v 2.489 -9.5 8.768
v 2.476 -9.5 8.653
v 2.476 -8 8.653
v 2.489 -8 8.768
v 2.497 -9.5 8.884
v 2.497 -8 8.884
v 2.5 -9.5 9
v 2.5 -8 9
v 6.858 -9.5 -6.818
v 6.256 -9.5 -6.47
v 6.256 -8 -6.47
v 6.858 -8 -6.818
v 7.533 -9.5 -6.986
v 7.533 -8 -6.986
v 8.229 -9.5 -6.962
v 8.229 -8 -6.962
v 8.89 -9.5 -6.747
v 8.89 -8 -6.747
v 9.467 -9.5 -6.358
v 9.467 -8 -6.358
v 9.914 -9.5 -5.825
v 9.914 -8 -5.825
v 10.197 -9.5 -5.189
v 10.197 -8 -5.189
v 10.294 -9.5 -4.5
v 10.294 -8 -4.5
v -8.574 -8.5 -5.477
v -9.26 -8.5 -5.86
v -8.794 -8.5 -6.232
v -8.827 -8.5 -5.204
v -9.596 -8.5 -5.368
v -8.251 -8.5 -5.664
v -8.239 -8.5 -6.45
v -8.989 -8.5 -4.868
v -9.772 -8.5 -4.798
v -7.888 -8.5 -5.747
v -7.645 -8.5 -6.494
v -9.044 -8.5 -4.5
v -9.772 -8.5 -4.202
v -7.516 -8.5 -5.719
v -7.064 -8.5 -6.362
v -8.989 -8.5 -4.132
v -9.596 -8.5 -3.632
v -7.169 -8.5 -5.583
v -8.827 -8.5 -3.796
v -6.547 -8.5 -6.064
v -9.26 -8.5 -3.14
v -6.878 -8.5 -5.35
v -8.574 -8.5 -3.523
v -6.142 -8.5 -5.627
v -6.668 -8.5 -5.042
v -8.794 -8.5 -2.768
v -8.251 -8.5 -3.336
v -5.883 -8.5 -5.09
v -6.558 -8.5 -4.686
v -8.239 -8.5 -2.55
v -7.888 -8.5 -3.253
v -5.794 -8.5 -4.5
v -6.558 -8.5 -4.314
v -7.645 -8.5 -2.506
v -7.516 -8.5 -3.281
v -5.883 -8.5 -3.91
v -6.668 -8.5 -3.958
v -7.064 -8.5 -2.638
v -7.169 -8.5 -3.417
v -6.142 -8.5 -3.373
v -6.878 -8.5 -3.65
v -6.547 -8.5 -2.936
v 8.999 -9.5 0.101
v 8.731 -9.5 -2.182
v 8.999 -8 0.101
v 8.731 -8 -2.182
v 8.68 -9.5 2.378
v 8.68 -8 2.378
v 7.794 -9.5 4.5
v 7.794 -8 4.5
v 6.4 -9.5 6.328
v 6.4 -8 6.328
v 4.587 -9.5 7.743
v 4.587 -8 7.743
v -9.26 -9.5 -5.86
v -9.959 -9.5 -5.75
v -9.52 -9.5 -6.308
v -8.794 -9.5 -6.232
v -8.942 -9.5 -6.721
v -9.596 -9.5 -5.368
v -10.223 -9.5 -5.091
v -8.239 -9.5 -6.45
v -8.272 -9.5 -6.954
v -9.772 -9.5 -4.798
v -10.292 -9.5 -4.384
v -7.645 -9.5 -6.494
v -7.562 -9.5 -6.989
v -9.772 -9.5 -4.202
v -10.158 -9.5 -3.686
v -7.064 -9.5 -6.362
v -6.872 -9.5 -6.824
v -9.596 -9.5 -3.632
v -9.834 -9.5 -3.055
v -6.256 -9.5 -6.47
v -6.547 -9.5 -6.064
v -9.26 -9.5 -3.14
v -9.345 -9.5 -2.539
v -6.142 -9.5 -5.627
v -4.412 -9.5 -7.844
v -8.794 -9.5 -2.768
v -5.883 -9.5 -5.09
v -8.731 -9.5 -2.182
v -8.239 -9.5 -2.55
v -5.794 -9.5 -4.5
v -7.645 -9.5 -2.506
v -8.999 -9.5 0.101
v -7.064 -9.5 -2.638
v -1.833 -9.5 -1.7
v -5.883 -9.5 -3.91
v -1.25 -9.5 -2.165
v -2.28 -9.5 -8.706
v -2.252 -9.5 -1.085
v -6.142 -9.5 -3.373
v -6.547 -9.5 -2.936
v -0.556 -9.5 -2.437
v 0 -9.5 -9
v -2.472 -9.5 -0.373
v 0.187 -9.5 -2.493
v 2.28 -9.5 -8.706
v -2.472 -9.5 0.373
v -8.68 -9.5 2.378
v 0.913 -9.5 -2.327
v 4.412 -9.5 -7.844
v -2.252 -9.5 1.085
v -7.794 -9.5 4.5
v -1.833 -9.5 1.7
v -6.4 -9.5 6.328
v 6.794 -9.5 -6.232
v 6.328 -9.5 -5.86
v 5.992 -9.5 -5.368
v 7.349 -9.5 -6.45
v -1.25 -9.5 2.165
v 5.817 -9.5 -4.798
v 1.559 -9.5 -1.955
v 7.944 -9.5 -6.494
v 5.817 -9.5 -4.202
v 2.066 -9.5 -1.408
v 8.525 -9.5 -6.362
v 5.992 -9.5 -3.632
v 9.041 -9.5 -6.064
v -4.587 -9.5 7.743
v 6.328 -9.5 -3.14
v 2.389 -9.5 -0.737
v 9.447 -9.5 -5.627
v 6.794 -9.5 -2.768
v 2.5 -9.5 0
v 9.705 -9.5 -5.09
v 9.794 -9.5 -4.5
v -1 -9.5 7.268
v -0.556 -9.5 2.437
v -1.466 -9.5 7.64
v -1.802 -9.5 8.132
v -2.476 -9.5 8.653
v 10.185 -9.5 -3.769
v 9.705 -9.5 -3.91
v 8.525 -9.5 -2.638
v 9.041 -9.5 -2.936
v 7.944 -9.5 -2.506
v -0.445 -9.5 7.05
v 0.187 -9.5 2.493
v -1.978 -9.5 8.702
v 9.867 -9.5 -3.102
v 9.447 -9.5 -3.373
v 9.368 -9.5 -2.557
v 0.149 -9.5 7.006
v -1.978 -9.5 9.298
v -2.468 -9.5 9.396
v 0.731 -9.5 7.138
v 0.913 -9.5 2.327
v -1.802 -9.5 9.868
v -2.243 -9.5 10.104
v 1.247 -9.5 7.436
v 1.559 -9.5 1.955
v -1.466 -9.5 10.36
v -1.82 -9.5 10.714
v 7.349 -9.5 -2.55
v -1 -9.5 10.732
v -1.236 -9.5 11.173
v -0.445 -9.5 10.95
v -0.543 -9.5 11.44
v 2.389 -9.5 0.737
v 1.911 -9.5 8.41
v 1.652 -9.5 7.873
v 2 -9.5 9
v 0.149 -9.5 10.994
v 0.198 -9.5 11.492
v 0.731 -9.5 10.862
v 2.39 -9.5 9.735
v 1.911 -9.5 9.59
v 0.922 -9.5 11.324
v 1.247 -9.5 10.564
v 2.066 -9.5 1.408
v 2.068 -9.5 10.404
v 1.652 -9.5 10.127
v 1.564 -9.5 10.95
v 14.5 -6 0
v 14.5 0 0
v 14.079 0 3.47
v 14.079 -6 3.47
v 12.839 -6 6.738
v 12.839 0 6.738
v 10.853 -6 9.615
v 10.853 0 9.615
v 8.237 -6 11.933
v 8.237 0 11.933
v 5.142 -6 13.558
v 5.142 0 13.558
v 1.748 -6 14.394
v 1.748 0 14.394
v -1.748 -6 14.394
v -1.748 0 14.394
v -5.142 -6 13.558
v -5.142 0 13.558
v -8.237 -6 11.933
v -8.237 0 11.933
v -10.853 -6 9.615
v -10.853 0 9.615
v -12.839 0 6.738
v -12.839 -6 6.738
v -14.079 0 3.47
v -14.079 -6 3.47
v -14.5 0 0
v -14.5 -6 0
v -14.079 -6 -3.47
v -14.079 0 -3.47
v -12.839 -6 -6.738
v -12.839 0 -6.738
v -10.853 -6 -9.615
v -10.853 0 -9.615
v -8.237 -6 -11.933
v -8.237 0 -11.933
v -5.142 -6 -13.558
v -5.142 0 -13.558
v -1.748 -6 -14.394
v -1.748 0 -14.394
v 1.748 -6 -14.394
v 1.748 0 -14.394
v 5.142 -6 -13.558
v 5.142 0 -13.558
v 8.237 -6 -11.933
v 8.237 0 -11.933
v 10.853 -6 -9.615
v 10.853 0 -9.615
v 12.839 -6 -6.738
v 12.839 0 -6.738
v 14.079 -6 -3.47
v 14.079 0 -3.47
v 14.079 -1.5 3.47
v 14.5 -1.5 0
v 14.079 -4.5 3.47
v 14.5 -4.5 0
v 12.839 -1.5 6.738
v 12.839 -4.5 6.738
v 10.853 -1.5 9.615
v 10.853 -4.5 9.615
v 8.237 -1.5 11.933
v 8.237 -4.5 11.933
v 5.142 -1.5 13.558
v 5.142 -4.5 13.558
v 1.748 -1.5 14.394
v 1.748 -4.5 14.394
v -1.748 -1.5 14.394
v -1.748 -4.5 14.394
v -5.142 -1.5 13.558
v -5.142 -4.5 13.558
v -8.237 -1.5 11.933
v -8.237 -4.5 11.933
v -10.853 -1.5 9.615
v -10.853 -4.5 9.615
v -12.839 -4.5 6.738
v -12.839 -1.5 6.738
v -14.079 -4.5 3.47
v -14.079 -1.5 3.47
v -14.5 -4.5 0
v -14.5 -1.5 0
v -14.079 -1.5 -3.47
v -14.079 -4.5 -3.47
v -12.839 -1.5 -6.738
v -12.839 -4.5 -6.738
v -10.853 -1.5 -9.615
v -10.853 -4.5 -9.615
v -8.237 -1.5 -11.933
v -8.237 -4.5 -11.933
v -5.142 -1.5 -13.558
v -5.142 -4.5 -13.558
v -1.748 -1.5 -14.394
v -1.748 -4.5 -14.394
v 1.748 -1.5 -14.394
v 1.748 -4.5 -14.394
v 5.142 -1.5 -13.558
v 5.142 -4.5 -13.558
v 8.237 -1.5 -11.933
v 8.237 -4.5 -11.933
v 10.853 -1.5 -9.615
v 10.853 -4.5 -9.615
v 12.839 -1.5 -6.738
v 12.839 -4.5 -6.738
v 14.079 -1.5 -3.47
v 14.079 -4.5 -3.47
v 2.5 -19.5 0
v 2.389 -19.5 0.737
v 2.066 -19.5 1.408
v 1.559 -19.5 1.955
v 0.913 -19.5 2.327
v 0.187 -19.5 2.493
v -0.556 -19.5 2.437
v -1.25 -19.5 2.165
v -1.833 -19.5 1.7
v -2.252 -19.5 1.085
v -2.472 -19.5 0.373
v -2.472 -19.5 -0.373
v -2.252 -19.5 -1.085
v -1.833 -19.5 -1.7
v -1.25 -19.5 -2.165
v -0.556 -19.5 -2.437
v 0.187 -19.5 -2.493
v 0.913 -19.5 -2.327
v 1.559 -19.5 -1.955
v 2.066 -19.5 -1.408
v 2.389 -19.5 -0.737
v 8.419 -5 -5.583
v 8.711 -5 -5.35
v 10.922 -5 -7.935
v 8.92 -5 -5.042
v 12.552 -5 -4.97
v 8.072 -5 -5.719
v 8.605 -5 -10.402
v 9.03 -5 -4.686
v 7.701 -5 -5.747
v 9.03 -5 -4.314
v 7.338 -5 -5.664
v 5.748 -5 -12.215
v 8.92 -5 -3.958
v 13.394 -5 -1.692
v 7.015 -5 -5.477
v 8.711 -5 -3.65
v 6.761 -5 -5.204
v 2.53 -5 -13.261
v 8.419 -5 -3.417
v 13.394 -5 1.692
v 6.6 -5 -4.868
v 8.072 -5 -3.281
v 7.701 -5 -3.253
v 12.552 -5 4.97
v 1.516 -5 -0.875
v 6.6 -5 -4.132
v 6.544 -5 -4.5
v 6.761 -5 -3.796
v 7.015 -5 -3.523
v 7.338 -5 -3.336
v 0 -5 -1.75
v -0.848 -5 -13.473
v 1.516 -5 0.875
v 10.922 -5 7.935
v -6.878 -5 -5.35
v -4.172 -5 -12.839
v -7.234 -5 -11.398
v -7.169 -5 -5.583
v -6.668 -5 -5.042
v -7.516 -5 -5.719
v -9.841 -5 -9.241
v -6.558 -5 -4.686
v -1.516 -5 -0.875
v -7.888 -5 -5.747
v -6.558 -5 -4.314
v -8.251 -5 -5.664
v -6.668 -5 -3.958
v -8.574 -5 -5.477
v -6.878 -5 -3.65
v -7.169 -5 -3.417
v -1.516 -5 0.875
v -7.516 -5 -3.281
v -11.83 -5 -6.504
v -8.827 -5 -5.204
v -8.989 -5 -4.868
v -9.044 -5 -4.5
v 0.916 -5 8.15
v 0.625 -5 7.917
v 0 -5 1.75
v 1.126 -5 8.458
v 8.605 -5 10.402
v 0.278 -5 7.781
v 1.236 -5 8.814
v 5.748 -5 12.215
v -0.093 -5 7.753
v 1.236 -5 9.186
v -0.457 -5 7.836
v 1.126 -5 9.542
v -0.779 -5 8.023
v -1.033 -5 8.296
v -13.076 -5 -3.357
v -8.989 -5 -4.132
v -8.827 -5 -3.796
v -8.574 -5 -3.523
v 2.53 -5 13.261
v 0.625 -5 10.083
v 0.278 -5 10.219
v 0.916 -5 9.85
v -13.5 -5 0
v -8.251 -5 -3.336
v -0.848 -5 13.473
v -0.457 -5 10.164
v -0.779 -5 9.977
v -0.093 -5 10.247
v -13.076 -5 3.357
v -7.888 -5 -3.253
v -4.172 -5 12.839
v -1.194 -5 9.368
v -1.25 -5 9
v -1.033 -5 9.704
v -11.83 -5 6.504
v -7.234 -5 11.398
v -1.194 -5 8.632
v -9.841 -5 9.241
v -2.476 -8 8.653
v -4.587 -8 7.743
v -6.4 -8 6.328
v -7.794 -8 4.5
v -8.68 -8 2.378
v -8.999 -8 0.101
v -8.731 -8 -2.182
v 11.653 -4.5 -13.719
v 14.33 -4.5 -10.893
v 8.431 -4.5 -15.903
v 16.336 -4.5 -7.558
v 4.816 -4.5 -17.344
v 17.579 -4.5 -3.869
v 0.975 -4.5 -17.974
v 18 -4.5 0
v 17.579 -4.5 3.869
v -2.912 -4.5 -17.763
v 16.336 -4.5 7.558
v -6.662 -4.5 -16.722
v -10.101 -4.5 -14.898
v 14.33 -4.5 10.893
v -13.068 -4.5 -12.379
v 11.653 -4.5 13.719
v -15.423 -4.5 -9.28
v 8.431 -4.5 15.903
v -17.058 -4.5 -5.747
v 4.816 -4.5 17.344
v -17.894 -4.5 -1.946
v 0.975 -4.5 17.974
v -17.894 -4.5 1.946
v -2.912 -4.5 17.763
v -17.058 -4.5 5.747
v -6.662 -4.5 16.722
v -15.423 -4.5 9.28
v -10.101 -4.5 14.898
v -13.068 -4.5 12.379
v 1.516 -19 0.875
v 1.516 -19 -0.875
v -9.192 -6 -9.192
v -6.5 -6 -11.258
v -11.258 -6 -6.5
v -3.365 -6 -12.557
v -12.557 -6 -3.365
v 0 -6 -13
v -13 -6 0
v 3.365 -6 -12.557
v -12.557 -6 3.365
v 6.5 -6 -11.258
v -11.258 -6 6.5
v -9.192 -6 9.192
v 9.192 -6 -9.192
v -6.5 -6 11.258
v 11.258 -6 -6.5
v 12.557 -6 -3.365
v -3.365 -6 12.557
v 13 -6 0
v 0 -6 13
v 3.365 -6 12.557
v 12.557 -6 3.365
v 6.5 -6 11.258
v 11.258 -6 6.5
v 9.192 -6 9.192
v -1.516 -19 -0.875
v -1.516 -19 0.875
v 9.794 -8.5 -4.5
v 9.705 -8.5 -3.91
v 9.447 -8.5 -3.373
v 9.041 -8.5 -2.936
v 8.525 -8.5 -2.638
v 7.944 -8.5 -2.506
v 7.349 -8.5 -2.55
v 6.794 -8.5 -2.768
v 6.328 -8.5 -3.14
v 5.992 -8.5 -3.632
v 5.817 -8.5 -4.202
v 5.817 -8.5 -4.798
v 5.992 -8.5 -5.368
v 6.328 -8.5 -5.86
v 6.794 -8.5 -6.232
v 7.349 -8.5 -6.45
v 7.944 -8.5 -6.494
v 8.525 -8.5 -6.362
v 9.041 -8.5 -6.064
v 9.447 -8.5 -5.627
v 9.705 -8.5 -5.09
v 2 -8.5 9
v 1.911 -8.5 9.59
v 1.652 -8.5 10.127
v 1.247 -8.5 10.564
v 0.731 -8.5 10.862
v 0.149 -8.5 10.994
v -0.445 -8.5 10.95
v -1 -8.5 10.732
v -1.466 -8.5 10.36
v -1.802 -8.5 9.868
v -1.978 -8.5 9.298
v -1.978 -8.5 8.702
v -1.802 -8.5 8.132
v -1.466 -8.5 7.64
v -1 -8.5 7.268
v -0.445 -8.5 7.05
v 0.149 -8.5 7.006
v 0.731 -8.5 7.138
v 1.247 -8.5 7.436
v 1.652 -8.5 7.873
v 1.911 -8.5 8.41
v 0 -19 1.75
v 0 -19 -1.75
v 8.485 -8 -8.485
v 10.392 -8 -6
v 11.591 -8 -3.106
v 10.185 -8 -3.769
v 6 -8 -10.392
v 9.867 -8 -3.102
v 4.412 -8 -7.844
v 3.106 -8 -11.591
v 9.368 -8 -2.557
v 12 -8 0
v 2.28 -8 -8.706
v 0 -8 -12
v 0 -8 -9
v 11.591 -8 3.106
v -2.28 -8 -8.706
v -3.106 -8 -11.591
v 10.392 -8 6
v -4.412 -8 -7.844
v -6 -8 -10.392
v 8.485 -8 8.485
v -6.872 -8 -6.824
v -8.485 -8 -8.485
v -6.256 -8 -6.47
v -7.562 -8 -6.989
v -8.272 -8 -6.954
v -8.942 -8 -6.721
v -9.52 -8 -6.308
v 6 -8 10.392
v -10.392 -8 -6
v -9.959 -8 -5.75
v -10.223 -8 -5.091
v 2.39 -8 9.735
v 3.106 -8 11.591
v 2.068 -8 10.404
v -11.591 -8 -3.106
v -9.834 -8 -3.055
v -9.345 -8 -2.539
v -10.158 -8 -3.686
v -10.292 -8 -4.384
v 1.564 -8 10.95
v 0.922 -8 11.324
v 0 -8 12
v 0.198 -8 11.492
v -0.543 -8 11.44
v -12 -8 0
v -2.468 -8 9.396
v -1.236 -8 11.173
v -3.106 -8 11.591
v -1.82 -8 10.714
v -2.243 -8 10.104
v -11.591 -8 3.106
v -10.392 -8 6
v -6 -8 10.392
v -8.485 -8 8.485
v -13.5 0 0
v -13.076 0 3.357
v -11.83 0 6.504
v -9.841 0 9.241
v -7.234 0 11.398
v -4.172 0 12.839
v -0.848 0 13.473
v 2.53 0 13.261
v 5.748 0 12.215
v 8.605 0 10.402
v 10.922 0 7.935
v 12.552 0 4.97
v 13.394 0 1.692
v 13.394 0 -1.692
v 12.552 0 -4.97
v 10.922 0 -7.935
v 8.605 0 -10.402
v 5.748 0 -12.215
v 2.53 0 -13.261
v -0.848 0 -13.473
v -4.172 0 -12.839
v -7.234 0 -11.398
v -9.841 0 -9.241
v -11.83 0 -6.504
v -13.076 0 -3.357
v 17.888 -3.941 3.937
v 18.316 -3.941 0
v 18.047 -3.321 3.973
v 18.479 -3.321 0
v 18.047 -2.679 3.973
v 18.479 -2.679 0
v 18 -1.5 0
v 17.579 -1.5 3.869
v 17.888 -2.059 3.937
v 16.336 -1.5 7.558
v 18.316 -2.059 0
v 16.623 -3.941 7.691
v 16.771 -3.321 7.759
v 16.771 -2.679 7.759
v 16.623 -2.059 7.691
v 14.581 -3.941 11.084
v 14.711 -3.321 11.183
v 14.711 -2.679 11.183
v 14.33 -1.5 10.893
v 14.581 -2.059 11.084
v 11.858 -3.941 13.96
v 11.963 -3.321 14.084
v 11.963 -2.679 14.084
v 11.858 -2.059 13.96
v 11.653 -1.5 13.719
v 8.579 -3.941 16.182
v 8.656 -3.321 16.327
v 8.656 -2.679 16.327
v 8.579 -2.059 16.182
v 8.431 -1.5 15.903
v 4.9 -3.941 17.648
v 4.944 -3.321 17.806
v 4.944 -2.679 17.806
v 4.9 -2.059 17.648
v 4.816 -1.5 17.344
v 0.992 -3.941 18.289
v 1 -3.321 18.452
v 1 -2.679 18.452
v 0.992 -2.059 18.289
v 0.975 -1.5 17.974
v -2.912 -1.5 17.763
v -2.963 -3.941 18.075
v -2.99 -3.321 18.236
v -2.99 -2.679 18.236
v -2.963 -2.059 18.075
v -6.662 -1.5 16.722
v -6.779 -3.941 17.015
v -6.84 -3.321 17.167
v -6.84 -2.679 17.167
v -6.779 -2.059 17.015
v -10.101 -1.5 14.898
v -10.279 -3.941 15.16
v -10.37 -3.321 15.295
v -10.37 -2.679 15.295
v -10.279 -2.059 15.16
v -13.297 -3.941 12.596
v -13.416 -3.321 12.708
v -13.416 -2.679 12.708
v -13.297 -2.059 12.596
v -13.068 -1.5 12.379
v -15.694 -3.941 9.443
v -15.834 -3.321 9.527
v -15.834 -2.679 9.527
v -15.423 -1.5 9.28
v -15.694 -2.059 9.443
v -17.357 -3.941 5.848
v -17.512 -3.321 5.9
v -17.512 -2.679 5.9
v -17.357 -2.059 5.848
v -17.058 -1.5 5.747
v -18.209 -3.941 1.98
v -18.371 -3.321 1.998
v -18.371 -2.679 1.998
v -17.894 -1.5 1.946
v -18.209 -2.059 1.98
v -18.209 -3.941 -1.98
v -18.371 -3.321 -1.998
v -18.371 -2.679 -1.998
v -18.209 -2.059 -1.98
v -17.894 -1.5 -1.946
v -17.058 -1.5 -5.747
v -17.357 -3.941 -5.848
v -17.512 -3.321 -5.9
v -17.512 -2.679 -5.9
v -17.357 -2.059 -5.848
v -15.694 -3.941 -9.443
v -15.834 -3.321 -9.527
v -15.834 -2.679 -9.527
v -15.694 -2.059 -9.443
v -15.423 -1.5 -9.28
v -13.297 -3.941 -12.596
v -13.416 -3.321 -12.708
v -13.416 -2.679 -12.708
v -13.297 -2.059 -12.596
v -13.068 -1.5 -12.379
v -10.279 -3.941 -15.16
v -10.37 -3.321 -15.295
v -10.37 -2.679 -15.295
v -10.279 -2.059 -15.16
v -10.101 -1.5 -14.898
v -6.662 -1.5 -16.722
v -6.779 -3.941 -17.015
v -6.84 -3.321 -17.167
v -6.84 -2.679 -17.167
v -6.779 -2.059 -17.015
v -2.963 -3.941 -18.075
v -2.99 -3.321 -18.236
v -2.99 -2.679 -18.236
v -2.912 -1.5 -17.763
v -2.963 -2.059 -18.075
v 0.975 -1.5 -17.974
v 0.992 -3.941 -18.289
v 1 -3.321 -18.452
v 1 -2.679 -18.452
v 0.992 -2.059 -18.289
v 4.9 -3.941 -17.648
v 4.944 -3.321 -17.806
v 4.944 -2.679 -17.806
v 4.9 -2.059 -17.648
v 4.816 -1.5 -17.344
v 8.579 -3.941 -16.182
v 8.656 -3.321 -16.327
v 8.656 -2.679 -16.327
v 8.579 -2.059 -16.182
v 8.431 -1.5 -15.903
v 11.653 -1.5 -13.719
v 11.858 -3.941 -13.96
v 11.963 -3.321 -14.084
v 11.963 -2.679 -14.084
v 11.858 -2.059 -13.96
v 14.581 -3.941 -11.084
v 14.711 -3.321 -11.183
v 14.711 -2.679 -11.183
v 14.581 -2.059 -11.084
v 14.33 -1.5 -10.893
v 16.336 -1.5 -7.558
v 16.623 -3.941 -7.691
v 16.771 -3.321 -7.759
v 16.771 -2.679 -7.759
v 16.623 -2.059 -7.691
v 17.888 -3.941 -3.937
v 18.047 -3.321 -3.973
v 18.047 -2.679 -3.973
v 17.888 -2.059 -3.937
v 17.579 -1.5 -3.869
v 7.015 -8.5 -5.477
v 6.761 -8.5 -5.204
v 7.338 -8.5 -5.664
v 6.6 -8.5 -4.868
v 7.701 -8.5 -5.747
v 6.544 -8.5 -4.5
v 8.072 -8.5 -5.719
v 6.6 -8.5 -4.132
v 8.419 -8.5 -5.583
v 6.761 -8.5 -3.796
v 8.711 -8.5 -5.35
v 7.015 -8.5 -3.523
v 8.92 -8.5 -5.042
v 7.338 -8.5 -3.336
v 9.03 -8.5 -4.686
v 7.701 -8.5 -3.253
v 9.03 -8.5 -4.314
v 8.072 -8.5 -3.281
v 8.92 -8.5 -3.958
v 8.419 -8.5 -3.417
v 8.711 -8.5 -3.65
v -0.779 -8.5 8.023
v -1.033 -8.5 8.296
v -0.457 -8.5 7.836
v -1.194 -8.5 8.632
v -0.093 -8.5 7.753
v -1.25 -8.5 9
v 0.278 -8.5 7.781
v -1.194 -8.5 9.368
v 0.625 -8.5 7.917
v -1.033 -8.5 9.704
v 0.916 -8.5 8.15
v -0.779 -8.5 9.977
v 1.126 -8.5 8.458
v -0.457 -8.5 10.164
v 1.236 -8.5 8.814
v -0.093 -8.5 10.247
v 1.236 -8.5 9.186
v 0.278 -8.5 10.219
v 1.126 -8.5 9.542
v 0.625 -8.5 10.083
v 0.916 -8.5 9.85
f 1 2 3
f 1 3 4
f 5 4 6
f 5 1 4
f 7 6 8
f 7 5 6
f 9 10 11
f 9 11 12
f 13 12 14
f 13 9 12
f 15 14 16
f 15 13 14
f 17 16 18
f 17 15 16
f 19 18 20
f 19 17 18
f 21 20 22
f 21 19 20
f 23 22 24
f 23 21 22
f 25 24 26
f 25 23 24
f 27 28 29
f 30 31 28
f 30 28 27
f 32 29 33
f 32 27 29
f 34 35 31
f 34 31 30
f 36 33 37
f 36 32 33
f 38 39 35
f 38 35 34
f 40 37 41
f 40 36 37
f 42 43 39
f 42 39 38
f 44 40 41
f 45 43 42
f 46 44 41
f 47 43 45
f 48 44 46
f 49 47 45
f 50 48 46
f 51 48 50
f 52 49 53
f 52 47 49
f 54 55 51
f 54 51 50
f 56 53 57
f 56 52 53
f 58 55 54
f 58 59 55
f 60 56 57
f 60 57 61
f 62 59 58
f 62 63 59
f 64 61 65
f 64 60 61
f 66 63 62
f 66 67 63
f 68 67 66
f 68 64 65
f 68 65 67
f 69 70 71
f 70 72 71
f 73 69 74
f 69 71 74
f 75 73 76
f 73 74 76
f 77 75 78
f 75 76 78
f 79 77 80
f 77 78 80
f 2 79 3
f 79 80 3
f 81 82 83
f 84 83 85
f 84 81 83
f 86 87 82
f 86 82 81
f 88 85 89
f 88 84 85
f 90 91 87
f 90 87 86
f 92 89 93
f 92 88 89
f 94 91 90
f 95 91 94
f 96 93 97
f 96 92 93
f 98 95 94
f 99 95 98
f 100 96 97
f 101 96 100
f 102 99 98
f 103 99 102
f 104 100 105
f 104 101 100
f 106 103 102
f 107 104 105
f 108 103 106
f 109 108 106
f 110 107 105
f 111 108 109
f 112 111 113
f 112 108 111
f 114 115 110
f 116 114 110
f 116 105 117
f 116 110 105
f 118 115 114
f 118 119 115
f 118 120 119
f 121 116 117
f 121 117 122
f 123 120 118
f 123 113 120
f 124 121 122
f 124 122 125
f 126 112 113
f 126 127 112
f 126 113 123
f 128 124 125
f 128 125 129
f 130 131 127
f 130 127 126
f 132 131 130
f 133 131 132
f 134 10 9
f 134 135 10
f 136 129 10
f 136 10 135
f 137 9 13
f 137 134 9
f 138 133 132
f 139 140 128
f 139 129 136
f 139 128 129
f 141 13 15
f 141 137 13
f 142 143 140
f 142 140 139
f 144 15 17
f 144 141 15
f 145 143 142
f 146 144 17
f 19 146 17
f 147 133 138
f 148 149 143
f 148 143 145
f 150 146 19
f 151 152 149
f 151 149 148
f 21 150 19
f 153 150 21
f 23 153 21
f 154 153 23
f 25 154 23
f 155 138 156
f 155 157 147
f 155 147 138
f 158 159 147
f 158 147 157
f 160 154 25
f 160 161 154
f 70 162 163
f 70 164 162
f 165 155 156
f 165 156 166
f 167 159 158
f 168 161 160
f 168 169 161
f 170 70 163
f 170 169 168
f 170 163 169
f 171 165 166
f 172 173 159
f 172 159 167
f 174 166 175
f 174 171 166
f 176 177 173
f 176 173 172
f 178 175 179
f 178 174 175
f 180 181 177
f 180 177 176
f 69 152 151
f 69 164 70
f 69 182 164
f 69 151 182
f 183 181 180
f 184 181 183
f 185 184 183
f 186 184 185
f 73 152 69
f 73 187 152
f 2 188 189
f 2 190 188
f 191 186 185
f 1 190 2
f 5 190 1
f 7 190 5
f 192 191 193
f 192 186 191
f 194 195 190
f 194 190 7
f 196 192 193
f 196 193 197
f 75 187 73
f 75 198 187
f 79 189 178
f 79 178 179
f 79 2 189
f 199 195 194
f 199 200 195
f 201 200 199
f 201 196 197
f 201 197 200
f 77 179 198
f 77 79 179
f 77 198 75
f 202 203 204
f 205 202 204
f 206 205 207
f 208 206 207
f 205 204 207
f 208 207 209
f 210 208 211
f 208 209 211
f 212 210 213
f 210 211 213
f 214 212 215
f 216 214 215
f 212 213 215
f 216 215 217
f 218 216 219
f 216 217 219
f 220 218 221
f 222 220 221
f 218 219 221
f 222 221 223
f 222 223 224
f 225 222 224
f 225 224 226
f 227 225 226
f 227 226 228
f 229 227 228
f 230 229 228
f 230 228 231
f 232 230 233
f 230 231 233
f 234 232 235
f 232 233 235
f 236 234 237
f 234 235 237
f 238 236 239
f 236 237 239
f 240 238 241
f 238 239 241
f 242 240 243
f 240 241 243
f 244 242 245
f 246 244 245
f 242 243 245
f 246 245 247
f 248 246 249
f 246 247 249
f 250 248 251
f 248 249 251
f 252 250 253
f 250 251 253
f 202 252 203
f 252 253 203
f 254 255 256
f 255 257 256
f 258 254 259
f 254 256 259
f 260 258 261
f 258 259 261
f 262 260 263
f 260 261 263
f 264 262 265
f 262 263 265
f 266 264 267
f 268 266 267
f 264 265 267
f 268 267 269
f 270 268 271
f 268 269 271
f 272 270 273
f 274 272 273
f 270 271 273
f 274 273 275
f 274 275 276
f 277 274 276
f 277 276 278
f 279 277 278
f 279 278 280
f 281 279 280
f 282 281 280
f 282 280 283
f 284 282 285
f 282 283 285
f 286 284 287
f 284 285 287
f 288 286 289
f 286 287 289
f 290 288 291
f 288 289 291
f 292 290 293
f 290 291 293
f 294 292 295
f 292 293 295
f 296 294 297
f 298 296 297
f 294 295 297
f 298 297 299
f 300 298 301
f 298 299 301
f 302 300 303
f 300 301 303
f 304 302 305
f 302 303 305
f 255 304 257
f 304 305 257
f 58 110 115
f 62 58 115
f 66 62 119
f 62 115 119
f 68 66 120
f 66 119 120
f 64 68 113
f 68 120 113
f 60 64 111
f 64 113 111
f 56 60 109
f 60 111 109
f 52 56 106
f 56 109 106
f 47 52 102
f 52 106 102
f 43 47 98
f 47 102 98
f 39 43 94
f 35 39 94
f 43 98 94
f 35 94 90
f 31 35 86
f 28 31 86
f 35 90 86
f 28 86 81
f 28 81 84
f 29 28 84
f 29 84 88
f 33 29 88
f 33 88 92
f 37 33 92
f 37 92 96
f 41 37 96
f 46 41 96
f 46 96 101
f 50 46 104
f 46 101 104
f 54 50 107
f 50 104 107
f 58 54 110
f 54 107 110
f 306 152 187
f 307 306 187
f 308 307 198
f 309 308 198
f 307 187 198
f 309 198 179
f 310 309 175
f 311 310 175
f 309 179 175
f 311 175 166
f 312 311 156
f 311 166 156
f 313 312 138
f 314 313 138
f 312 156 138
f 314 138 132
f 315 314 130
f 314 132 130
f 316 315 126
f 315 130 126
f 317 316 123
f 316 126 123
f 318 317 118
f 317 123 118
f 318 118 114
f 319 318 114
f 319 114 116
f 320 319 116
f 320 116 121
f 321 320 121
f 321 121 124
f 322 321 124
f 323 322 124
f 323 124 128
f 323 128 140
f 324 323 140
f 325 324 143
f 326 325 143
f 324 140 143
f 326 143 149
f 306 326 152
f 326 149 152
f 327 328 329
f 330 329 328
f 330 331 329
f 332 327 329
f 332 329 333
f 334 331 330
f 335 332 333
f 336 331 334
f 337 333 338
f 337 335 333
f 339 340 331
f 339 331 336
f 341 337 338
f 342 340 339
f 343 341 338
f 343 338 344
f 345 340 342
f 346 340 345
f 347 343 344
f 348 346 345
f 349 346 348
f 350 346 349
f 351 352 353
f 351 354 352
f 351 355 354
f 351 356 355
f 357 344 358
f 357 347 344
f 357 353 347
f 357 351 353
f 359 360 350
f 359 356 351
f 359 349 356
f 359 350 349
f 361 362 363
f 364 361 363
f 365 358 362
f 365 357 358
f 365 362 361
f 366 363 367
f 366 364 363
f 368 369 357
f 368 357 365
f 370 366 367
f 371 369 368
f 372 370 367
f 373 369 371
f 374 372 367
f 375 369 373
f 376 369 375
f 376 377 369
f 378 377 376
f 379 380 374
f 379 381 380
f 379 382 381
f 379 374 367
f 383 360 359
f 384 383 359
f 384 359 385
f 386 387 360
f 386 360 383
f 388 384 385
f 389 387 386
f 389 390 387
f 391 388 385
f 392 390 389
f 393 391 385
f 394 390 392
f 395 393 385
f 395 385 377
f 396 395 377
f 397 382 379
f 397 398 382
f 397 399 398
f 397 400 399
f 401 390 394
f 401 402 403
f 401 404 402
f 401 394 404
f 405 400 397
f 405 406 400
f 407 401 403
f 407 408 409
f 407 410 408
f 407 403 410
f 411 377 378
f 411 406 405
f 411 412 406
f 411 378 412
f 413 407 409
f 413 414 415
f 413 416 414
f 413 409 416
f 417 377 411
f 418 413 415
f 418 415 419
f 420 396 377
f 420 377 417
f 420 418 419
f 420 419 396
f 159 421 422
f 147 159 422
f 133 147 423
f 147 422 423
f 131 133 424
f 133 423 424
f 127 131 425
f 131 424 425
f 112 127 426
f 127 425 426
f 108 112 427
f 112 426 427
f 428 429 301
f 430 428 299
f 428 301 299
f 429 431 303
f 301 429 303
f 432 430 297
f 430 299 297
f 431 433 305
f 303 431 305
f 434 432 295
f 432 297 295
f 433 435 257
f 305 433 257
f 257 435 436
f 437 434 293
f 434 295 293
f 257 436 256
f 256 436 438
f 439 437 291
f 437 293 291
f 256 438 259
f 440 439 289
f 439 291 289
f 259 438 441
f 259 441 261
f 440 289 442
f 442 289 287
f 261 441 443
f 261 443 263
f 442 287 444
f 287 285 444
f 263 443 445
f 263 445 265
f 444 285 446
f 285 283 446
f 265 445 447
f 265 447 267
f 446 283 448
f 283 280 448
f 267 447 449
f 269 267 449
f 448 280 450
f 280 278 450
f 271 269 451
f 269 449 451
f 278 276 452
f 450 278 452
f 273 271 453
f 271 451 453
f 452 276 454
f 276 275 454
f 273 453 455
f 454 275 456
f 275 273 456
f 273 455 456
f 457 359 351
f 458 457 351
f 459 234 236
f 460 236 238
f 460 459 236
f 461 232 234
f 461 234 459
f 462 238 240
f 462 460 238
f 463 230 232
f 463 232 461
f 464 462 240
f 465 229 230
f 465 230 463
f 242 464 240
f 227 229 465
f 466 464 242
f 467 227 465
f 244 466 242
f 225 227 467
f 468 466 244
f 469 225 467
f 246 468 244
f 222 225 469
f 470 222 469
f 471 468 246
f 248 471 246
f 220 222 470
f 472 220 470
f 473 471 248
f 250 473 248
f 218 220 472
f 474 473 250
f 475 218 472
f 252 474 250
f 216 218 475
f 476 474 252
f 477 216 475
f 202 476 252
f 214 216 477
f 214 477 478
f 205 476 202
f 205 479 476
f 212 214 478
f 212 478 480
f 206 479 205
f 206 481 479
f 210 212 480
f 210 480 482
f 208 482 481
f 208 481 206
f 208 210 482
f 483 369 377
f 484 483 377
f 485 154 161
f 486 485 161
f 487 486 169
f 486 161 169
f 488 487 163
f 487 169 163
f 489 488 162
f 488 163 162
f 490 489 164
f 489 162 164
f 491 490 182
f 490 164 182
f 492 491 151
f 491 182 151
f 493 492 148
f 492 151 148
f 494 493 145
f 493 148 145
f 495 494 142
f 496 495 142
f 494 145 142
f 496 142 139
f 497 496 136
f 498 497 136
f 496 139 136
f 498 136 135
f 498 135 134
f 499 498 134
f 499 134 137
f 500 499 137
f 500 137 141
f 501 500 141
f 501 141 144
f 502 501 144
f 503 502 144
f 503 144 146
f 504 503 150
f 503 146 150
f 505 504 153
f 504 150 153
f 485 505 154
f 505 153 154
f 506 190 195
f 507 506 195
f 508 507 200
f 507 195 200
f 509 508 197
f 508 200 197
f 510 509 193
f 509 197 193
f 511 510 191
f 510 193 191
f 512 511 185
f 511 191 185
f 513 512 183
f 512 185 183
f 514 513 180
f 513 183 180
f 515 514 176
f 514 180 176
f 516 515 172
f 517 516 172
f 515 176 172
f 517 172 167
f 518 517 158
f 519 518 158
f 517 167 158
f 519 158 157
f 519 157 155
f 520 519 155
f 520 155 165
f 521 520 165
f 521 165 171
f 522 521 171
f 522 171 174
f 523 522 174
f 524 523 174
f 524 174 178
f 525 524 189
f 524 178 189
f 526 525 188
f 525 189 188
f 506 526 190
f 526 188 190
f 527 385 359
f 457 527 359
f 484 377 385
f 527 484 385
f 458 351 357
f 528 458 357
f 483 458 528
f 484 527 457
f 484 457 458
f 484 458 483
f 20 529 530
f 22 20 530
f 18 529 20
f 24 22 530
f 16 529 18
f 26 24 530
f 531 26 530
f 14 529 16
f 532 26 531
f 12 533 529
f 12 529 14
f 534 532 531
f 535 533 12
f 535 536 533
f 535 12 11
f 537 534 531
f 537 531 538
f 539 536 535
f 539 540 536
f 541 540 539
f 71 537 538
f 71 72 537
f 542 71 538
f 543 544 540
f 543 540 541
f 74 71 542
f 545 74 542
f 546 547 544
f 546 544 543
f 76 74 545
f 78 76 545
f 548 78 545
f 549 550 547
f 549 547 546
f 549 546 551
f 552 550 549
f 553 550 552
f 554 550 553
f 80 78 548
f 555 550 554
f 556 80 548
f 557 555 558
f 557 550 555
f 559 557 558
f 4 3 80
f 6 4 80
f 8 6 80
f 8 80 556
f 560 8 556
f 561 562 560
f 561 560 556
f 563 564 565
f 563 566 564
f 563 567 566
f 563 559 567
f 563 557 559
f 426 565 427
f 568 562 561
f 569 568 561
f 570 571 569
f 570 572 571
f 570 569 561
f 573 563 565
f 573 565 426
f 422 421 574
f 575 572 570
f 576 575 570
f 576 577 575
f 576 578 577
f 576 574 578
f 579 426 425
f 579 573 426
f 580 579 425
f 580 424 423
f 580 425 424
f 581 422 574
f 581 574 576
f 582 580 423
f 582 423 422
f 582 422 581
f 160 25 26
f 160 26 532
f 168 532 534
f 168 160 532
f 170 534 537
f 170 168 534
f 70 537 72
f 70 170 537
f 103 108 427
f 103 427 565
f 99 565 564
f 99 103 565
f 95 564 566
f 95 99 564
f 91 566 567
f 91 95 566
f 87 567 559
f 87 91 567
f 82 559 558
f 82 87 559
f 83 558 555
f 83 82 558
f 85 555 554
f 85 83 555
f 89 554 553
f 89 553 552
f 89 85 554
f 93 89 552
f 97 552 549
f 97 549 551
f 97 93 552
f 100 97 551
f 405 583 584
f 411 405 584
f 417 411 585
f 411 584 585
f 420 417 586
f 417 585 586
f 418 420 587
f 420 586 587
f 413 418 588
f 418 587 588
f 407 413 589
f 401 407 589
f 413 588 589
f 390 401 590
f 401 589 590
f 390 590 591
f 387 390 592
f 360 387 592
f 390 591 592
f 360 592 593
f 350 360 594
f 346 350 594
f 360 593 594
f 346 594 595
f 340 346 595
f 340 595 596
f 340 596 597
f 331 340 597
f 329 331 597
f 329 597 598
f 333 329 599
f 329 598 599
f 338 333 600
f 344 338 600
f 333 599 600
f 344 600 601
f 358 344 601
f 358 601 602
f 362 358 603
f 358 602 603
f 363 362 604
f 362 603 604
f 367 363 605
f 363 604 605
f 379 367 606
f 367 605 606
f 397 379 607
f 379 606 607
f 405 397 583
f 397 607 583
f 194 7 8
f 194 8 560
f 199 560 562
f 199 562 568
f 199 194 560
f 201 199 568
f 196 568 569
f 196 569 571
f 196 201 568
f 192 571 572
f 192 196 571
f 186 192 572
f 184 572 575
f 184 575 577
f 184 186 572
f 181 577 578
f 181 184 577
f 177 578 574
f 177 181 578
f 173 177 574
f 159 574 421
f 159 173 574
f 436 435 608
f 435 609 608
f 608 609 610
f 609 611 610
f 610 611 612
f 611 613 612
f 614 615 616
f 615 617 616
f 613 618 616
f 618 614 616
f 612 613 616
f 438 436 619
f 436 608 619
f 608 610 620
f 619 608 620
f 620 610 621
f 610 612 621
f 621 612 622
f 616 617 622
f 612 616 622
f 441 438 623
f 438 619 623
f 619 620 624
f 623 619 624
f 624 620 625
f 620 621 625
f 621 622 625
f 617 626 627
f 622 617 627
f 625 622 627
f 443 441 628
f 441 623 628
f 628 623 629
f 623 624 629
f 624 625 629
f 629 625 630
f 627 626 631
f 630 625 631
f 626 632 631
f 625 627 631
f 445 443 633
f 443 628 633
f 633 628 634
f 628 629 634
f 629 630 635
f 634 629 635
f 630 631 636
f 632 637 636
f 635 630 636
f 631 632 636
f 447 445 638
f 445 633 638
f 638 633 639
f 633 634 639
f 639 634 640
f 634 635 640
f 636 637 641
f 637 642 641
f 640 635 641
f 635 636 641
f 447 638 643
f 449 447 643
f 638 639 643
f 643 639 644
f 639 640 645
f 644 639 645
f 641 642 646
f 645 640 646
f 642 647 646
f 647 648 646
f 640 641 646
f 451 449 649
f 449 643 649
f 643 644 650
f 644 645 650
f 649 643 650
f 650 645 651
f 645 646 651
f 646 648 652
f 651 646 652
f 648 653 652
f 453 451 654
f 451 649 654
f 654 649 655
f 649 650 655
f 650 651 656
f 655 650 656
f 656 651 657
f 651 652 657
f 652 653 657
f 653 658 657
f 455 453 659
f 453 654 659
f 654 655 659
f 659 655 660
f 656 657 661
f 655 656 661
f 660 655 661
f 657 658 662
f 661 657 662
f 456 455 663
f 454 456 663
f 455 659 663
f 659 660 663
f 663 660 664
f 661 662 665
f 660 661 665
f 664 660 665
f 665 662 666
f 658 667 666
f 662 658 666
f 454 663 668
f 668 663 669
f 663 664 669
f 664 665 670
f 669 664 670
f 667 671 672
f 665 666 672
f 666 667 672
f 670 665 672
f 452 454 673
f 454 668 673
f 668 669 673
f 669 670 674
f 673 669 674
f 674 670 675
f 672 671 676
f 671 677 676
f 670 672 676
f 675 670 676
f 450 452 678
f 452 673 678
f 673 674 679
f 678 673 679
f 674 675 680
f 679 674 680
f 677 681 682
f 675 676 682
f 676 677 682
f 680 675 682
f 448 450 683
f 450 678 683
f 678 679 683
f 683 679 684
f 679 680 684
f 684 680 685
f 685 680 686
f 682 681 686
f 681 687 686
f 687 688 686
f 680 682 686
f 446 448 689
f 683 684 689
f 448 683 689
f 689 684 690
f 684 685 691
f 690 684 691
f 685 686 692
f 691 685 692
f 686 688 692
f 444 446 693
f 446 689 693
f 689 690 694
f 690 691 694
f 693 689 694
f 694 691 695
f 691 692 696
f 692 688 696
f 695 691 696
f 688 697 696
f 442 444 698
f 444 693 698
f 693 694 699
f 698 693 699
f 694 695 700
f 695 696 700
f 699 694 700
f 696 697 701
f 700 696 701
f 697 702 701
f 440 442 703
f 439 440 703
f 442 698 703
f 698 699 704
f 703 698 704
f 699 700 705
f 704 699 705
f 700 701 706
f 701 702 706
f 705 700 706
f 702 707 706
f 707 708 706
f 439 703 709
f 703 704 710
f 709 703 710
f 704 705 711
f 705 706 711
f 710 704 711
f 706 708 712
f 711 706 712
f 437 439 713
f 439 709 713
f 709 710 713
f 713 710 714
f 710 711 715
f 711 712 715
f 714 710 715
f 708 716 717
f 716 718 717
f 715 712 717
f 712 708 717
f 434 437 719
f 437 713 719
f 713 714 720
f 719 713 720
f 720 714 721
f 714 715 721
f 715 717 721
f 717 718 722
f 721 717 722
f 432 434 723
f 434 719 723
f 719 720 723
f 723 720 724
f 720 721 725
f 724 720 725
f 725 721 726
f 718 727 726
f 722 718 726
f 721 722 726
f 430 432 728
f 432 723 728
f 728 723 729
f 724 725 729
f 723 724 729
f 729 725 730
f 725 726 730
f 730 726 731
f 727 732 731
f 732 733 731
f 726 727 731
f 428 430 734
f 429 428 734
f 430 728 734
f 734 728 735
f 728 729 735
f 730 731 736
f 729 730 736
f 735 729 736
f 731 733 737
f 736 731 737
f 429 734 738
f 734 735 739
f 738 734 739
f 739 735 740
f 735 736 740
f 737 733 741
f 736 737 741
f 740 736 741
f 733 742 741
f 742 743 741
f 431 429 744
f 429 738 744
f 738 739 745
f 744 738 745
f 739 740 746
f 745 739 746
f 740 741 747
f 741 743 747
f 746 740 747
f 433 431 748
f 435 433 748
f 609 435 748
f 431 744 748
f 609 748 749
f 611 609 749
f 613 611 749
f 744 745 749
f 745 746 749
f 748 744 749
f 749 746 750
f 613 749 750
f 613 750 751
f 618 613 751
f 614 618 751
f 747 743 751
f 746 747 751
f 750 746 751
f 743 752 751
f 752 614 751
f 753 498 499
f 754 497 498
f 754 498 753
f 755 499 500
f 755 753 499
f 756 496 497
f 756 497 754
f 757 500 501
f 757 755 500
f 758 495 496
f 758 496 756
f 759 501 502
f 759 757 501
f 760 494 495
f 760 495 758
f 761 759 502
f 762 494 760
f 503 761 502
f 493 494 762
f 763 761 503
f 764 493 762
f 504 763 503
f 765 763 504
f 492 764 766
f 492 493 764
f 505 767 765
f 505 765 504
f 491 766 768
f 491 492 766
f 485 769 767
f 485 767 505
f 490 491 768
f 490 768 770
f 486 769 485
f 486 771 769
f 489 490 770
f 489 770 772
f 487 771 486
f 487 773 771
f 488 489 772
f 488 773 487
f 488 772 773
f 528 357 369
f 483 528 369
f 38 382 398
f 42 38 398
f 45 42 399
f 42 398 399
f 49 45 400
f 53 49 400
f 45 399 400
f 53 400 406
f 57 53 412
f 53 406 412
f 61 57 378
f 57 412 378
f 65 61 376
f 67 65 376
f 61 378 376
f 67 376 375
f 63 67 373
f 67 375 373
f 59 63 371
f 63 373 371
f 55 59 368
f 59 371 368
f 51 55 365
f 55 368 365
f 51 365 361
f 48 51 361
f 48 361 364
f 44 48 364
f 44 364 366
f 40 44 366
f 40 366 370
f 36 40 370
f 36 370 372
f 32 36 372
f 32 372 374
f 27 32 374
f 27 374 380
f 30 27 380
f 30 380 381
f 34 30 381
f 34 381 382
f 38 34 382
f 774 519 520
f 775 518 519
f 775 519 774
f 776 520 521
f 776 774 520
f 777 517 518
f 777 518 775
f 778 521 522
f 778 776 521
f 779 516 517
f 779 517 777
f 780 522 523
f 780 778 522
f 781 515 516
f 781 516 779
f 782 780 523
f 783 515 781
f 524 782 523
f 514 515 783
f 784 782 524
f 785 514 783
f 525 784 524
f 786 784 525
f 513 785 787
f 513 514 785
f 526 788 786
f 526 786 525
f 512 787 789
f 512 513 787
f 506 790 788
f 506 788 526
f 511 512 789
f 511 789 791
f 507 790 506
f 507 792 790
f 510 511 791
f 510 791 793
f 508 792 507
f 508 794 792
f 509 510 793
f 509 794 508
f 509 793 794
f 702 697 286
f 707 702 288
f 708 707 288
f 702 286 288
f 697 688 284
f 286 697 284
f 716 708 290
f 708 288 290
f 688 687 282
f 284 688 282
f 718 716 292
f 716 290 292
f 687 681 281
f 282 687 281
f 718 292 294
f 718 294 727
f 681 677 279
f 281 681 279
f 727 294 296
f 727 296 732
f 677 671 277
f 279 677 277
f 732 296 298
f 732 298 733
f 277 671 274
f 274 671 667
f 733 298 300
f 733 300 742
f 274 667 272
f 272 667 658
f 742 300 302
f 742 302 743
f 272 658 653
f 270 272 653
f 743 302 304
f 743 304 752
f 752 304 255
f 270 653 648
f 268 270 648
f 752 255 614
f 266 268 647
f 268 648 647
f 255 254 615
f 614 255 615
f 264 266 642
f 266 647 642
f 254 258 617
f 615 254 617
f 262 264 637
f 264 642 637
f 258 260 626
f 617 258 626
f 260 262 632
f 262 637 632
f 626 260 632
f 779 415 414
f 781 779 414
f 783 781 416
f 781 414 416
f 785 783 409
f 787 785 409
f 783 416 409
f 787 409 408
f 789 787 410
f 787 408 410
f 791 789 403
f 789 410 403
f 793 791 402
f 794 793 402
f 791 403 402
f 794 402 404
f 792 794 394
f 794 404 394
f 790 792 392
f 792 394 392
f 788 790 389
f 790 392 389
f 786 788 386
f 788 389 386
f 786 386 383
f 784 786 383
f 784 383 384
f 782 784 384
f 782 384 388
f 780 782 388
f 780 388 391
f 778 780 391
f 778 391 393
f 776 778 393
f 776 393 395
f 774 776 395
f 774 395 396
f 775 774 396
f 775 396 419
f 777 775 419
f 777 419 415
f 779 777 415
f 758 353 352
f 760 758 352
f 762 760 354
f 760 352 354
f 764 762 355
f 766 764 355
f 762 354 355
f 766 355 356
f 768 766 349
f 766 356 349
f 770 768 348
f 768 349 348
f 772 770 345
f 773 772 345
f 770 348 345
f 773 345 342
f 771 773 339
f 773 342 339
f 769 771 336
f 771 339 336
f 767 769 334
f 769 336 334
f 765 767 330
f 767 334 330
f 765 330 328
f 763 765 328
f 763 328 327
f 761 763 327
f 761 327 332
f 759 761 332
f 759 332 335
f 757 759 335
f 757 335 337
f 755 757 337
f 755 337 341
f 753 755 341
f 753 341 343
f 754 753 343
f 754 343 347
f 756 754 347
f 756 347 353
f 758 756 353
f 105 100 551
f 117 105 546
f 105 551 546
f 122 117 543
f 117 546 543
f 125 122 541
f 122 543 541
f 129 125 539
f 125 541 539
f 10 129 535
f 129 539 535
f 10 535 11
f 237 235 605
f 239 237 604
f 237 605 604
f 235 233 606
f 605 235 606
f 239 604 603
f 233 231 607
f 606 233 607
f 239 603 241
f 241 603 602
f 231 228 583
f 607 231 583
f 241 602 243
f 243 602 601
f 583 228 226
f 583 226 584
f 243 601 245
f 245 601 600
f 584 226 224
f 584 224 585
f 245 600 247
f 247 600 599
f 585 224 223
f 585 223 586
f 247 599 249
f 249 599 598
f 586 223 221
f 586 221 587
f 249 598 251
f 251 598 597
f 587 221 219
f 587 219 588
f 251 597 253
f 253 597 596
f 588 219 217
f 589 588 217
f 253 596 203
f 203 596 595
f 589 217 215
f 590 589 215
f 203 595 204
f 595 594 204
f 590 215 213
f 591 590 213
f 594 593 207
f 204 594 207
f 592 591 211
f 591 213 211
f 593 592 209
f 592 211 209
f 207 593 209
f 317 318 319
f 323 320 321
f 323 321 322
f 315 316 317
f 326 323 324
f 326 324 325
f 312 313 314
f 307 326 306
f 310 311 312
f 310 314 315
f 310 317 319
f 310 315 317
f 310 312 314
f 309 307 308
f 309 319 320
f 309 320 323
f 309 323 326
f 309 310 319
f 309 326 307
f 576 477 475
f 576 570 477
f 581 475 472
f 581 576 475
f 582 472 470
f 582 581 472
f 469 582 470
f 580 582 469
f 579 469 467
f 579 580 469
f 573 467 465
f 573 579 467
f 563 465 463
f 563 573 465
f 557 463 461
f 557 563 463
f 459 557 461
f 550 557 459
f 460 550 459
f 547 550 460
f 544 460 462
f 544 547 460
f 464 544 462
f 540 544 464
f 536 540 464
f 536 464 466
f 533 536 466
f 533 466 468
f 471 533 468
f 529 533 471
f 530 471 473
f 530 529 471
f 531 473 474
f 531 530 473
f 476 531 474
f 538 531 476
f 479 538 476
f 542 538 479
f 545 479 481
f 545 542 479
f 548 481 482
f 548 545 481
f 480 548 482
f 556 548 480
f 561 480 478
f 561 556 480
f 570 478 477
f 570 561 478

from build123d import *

# Parameters (mm, degrees)
F0_R      = 14.5
F1_DEPTH  = 6
F4_R      = 9
F5_DEPTH  = 1.5
F6_R      = 2.5
F7_DEPTH  = 10
F9_DEPTH  = 9
F10_R     = 13.5
F11_DEPTH = 5
F13_DEPTH = 14
F18_R     = 1.25
F19_DEPTH = 4.5
F16_R     = 2
F20_DEPTH = 1


with BuildPart() as f1:
    # F0 (on Front) → F1 (new body)
    with BuildSketch(Plane.XZ):
        Circle(F0_R)
    extrude(amount=F1_DEPTH)

    # F2 (on Right) → F3 (revolve)
    with BuildSketch(Plane.YZ):
        Polygon((-8, 0), (-6, 0), (-6, 13), (-8, 12), align=None)
    revolve(axis=Axis((0, -7, 0), (0, -1, 0)))

    # F4 (on face) → F5 (join)
    with BuildSketch(Plane.XZ.offset(8)):
        Circle(F4_R)
    extrude(amount=F5_DEPTH)

    # F6 (on face) → F7 (join)
    with BuildSketch(Plane.XZ.offset(9.5)):
        Circle(F6_R)
    extrude(amount=F7_DEPTH)

    # F8 (on face) → F9 (join)
    with BuildSketch(Plane.XZ.offset(9.5)):
        with BuildLine():
            ThreePointArc((8.731410332, -2.1823092387), (7.6201953269, -2.0060648749), (6.5442286341, -2.3349364905))
            Line((6.5442286341, -2.3349364905), (7.7942286341, -4.5))
            ThreePointArc((7.7942286341, -4.5), (8.3436867406, -3.3738541128), (8.731410332, -2.1823092387))
        make_face()
        with BuildLine():
            ThreePointArc((8.731410332, -2.1823092387), (8.3436867406, -3.3738541128), (7.7942286341, -4.5))
            ThreePointArc((7.7942286341, -4.5), (7.0936867406, -5.5389176222), (6.2556404057, -6.4704685391))
            ThreePointArc((6.2556404057, -6.4704685391), (8.8904789314, -6.7468278273), (10.2942286341, -4.5))
            ThreePointArc((10.2942286341, -4.5), (9.8670231541, -3.1023151723), (8.731410332, -2.1823092387))
        make_face()
        with BuildLine():
            ThreePointArc((6.2556404057, -6.4704685391), (7.0936867406, -5.5389176222), (7.7942286341, -4.5))
            Line((7.7942286341, -4.5), (5.2942286341, -4.5))
            ThreePointArc((5.2942286341, -4.5), (5.5474008068, -5.5962502974), (6.2556404057, -6.4704685391))
        make_face()
        with BuildLine():
            Line((7.7942286341, -4.5), (6.5442286341, -2.3349364905))
            ThreePointArc((6.5442286341, -2.3349364905), (5.6291651246, -3.25), (5.2942286341, -4.5))
            Line((5.2942286341, -4.5), (7.7942286341, -4.5))
        make_face()
        with BuildLine():
            ThreePointArc((-5.2942286341, -4.5), (-5.6291651246, -3.25), (-6.5442286341, -2.3349364905))
            Line((-6.5442286341, -2.3349364905), (-7.7942286341, -4.5))
            Line((-7.7942286341, -4.5), (-5.2942286341, -4.5))
        make_face()
        with BuildLine():
            Line((-7.7942286341, -4.5), (-6.5442286341, -2.3349364905))
            ThreePointArc((-6.5442286341, -2.3349364905), (-7.6201953269, -2.0060648749), (-8.731410332, -2.1823092387))
            ThreePointArc((-8.731410332, -2.1823092387), (-8.3436867406, -3.3738541128), (-7.7942286341, -4.5))
        make_face()
        with BuildLine():
            ThreePointArc((-7.7942286341, -4.5), (-8.3436867406, -3.3738541128), (-8.731410332, -2.1823092387))
            ThreePointArc((-8.731410332, -2.1823092387), (-9.9592921435, -5.75), (-6.2556404057, -6.4704685391))
            ThreePointArc((-6.2556404057, -6.4704685391), (-7.0936867406, -5.5389176222), (-7.7942286341, -4.5))
        make_face()
        with BuildLine():
            Line((-5.2942286341, -4.5), (-7.7942286341, -4.5))
            ThreePointArc((-7.7942286341, -4.5), (-7.0936867406, -5.5389176222), (-6.2556404057, -6.4704685391))
            ThreePointArc((-6.2556404057, -6.4704685391), (-5.5474008068, -5.5962502974), (-5.2942286341, -4.5))
        make_face()
        with BuildLine():
            Line((-1.25, 6.8349364905), (0, 9))
            ThreePointArc((0, 9), (-1.25, 8.912771735), (-2.4757699264, 8.6527777778))
            ThreePointArc((-2.4757699264, 8.6527777778), (-2.0727945201, 7.6023151723), (-1.25, 6.8349364905))
        make_face()
        with BuildLine():
            Line((1.25, 6.8349364905), (0, 9))
            Line((0, 9), (-1.25, 6.8349364905))
            ThreePointArc((-1.25, 6.8349364905), (0, 6.5), (1.25, 6.8349364905))
        make_face()
        with BuildLine():
            ThreePointArc((2.4757699264, 8.6527777778), (1.25, 8.912771735), (0, 9))
            Line((0, 9), (1.25, 6.8349364905))
            ThreePointArc((1.25, 6.8349364905), (2.0727945201, 7.6023151723), (2.4757699264, 8.6527777778))
        make_face()
        with BuildLine():
            ThreePointArc((-2.4757699264, 8.6527777778), (-1.25, 8.912771735), (0, 9))
            ThreePointArc((0, 9), (1.25, 8.912771735), (2.4757699264, 8.6527777778))
            ThreePointArc((2.4757699264, 8.6527777778), (2.4939351251, 8.8259666928), (2.5, 9))
            ThreePointArc((2.5, 9), (-0.1740333072, 11.4939351251), (-2.4757699264, 8.6527777778))
        make_face()
    extrude(amount=-F9_DEPTH)

    # F10 (on face) → F11 (cut)
    with BuildSketch(Plane(origin=(0, 0, 0), x_dir=(-1, 0, 0), z_dir=(0, 1, 0))):
        Circle(F10_R)
    extrude(amount=-F11_DEPTH, mode=Mode.SUBTRACT)

    # F12 (on face) → F13 (cut)
    with BuildSketch(Plane(origin=(0, -5, 0), x_dir=(-1, 0, 0), z_dir=(0, 1, 0))):
        Polygon((1.5155444566, 0.875), (0, 1.75), (-1.5155444566, 0.875), (-1.5155444566, -0.875), (0, -1.75), (1.5155444566, -0.875), align=None)
    extrude(amount=-F13_DEPTH, mode=Mode.SUBTRACT)

    # F18 (on face) → F19 (cut)
    with BuildSketch(Plane(origin=(0, -5, 0), x_dir=(-1, 0, 0), z_dir=(0, 1, 0))):
        with Locations((7.7942286341, -4.5)):
            Circle(F18_R)
        with Locations((0, 9)):
            Circle(F18_R)
        with Locations((-7.7942286341, -4.5)):
            Circle(F18_R)
    extrude(amount=-F19_DEPTH, mode=Mode.SUBTRACT)

    # F16 (on face) → F20 (cut)
    with BuildSketch(Plane.XZ.offset(9.5)):
        with Locations((-7.7942286341, -4.5)):
            Circle(F16_R)
        with Locations((7.7942286341, -4.5)):
            Circle(F16_R)
        with Locations((0, 9)):
            Circle(F16_R)
    extrude(amount=-F20_DEPTH, mode=Mode.SUBTRACT)


with BuildPart() as f15:
    # F14 (on Top) → F15 (revolve)
    with BuildSketch(Plane.XY):
        with BuildLine():
            Line((14.5, -1.5), (14.5, -3))
            Line((14.5, -3), (14.5, -4.5))
            Line((14.5, -4.5), (18, -4.5))
            ThreePointArc((18, -4.5), (18.5, -3), (18, -1.5))
            Line((18, -1.5), (14.5, -1.5))
        make_face()
    revolve(axis=Axis((0, -3, 0), (0, -1, 0)))


solid = Compound([f1.part, f15.part])
